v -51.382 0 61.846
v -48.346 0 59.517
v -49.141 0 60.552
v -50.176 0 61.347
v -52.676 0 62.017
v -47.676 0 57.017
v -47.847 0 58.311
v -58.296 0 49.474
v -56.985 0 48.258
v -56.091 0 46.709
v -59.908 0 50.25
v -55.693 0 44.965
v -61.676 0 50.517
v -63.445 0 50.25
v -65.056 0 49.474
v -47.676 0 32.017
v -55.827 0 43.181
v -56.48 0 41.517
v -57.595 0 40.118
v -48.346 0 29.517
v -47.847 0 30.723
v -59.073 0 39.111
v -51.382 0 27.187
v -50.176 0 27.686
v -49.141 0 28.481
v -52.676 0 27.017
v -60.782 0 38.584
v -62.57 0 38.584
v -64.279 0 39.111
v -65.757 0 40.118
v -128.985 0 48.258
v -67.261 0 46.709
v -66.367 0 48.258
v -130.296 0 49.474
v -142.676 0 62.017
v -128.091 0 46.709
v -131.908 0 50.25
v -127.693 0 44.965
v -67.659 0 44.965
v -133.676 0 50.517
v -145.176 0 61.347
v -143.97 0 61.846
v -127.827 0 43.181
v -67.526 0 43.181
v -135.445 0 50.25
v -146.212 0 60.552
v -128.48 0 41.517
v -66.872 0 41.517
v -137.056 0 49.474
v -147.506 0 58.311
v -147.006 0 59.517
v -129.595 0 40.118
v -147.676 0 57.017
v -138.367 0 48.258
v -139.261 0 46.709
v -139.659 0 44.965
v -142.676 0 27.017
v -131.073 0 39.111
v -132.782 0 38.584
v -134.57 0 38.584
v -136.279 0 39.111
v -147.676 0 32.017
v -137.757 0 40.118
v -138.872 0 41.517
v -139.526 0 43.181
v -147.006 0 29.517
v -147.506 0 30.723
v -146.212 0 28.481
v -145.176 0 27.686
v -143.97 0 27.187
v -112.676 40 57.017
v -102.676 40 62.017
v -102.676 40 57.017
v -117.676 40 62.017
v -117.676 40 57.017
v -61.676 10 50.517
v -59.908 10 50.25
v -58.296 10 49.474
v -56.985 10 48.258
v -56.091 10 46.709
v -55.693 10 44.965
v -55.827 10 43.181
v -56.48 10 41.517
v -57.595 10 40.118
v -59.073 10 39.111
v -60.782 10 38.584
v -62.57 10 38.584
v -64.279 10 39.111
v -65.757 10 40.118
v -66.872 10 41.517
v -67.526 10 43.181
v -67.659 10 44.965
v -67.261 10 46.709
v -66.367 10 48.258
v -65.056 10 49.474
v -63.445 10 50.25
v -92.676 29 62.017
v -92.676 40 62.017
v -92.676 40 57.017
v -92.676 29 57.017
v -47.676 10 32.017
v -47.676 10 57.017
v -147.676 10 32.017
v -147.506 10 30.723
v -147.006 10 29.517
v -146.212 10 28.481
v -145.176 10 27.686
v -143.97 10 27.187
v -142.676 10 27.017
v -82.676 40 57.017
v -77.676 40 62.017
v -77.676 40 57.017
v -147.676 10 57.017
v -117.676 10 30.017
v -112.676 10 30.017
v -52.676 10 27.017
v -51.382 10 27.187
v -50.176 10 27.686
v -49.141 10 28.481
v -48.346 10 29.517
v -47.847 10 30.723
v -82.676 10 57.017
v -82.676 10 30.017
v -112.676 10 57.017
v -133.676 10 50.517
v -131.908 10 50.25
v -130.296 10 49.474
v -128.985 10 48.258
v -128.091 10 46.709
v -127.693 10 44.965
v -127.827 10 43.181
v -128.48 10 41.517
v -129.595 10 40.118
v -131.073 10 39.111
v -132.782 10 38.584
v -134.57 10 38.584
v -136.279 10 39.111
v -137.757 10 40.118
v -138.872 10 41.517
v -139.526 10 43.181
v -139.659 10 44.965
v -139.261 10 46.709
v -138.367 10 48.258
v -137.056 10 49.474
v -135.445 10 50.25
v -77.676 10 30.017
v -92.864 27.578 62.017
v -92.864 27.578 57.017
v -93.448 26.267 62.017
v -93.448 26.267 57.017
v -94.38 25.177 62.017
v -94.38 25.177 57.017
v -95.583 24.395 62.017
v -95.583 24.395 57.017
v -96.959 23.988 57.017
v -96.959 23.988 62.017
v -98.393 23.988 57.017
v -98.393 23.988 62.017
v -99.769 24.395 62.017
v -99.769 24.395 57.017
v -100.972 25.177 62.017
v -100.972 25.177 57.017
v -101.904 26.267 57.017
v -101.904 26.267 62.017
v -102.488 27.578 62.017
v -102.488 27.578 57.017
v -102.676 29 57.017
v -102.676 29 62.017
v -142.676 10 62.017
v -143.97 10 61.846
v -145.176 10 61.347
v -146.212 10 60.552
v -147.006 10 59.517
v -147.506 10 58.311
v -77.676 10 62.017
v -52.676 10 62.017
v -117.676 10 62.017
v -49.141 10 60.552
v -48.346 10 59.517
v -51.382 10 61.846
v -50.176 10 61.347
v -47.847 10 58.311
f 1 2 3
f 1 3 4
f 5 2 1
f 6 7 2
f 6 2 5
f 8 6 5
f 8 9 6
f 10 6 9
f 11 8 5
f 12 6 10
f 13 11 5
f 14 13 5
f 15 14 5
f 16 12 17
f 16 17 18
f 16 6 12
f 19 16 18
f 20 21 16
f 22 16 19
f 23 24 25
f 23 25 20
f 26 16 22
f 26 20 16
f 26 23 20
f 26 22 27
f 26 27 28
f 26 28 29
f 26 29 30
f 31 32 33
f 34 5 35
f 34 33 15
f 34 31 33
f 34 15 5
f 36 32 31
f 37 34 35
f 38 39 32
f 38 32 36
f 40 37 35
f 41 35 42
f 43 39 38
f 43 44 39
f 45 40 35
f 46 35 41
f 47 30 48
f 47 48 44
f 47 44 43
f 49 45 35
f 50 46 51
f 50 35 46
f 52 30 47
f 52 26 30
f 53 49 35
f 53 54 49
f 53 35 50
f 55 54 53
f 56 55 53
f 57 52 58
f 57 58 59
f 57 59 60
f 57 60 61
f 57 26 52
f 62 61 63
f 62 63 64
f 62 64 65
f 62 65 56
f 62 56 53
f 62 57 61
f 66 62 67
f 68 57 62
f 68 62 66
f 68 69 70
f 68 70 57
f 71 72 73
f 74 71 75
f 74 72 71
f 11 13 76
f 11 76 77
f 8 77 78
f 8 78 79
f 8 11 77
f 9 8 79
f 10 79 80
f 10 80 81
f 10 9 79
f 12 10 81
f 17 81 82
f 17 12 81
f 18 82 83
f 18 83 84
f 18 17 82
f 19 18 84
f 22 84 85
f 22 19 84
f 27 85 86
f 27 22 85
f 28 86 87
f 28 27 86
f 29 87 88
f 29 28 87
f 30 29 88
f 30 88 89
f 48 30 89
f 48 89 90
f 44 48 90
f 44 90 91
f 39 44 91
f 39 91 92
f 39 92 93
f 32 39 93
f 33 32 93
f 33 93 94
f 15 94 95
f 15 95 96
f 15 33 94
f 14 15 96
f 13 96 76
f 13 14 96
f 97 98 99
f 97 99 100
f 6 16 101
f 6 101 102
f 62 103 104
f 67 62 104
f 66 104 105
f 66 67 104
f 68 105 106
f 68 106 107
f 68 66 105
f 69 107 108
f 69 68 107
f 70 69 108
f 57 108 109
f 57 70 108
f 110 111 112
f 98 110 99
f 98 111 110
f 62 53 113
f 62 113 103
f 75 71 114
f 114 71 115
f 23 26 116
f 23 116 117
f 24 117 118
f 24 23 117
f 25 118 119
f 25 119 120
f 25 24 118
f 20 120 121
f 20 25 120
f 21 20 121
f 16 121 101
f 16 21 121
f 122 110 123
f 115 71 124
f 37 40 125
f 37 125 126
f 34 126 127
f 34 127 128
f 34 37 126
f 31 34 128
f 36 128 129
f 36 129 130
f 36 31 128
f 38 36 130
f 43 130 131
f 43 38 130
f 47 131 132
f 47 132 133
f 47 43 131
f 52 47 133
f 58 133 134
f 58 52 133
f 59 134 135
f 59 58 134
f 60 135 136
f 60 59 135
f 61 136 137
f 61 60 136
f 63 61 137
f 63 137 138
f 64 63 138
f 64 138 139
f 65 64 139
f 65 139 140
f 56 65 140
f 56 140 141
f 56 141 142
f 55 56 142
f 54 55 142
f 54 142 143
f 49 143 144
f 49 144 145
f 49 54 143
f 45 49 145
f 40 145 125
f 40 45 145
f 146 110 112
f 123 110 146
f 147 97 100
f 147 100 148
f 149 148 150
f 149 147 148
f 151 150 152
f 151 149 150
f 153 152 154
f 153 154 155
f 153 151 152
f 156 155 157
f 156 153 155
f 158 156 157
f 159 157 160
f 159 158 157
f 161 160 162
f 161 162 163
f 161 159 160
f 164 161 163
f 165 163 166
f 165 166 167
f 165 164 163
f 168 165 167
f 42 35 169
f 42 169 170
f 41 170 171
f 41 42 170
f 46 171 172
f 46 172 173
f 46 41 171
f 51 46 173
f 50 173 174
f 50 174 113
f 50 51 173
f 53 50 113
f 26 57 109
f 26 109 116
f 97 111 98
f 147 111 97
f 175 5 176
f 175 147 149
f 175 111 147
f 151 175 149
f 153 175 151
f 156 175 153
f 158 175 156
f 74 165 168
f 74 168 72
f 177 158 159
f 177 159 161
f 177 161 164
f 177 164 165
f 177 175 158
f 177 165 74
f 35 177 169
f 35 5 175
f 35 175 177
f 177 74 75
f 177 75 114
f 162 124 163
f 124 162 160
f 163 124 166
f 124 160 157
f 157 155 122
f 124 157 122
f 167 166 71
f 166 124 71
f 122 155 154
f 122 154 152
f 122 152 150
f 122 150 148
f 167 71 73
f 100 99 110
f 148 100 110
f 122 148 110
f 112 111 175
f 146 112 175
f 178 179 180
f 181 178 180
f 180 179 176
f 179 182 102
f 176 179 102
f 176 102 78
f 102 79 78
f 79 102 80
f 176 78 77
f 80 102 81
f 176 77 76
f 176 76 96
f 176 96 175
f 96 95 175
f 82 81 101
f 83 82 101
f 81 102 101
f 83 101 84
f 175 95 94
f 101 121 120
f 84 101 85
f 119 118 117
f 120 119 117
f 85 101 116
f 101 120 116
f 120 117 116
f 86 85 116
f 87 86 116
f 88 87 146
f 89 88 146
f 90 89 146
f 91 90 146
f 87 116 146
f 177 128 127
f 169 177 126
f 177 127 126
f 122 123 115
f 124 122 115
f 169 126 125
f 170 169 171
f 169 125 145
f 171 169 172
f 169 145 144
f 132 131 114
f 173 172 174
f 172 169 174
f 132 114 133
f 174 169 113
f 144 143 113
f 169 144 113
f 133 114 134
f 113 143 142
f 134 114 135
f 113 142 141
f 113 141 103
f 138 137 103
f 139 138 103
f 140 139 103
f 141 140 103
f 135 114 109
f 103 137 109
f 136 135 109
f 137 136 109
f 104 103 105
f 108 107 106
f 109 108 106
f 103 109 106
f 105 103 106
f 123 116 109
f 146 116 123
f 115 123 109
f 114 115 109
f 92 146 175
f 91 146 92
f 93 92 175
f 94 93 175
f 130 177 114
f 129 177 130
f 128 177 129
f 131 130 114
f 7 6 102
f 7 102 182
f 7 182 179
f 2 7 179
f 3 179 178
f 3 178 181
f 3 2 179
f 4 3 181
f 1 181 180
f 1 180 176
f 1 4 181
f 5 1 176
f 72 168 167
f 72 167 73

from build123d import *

# Parameters (mm, degrees)
IZIM1_R                     = 6
Y_KSEKLIK_EKSTR_ZYON1_DEPTH = 10
Y_KSEKLIK_EKSTR_ZYON2_DEPTH = 5
FEDER1_REACH                = 103.716
IZIM5_WALL_W                = 245.79202862
IZIM5_WALL_H                = 5
FEDER8_REACH                = 103.716
IZIM6_WALL_W                = 245.79202862
IZIM6_WALL_H                = 5


with BuildPart() as part:
    # Çizim1 → Yükseklik-Ekstrüzyon1 (new body)
    with BuildSketch(Plane(origin=(0, 0, 0), x_dir=(1, 0, 0), z_dir=(0, 1, 0))):
        with BuildLine():
            Line((-142.676154711, -27.016601459), (-52.676154711, -27.016601459))
            ThreePointArc((-52.676154711, -27.016601459), (-49.140620805, -28.481067553), (-47.676154711, -32.016601459))
            Line((-47.676154711, -32.016601459), (-47.676154711, -57.016601459))
            ThreePointArc((-47.676154711, -57.016601459), (-49.140620805, -60.552135365), (-52.676154711, -62.016601459))
            Line((-52.676154711, -62.016601459), (-142.676154711, -62.016601459))
            ThreePointArc((-142.676154711, -62.016601459), (-146.211688617, -60.552135365), (-147.676154711, -57.016601459))
            Line((-147.676154711, -57.016601459), (-147.676154711, -32.016601459))
            ThreePointArc((-147.676154711, -32.016601459), (-146.211688617, -28.481067553), (-142.676154711, -27.016601459))
        make_face()
        with Locations(Location((-133.676154711, -44.516601459, 0), (0, 0, 270))):
            Circle(IZIM1_R, mode=Mode.SUBTRACT)
        with Locations(Location((-61.676154711, -44.516601459, 0), (0, 0, 270))):
            Circle(IZIM1_R, mode=Mode.SUBTRACT)
    extrude(amount=Y_KSEKLIK_EKSTR_ZYON1_DEPTH)

    # Çizim3 → Yükseklik-Ekstrüzyon2 (add)
    with BuildSketch(Plane.XY.offset(62.016601459)):
        with BuildLine():
            Line((-117.676154711, 40), (-117.676154711, 10))
            Line((-117.676154711, 10), (-77.676154711, 10))
            Line((-77.676154711, 10), (-77.676154711, 40))
            Line((-77.676154711, 40), (-92.676154711, 40))
            Line((-92.676154711, 40), (-92.676154711, 29))
            ThreePointArc((-92.676154711, 29), (-97.676154711, 23.936325368), (-102.676154711, 29))
            Line((-102.676154711, 29), (-102.676154711, 40))
            Line((-102.676154711, 40), (-117.676154711, 40))
        make_face()
    extrude(amount=-Y_KSEKLIK_EKSTR_ZYON2_DEPTH)

    # Çizim5 wall → Feder1 (add, up to next)
    with BuildSketch(Plane(origin=(-77.676154711, 25, 43.516601459), x_dir=(0, -0.743294146247, -0.668964731622), z_dir=(0, 0.668964731622, -0.743294146247)), mode=Mode.PRIVATE) as feder1_sk1:
        with Locations((0, 2.5)):
            Rectangle(IZIM5_WALL_W, IZIM5_WALL_H)
    feder1_tool1 = extrude(feder1_sk1.sketch, amount=-FEDER1_REACH, mode=Mode.PRIVATE) - part.part
    add(feder1_tool1.solids().sort_by_distance((-77.676154711, 25, 43.516601459))[0])

    # Çizim6 wall → Feder8 (add, up to next)
    with BuildSketch(Plane(origin=(-117.676154711, 25, 43.516601459), x_dir=(0, -0.743294146247, -0.668964731622), z_dir=(0, -0.668964731622, 0.743294146247)), mode=Mode.PRIVATE) as feder8_sk1:
        with Locations((0, 2.5)):
            Rectangle(IZIM6_WALL_W, IZIM6_WALL_H)
    feder8_tool1 = extrude(feder8_sk1.sketch, amount=FEDER8_REACH, mode=Mode.PRIVATE) - part.part
    add(feder8_tool1.solids().sort_by_distance((-117.676154711, 25, 43.516601459))[0])


solid = part.part
